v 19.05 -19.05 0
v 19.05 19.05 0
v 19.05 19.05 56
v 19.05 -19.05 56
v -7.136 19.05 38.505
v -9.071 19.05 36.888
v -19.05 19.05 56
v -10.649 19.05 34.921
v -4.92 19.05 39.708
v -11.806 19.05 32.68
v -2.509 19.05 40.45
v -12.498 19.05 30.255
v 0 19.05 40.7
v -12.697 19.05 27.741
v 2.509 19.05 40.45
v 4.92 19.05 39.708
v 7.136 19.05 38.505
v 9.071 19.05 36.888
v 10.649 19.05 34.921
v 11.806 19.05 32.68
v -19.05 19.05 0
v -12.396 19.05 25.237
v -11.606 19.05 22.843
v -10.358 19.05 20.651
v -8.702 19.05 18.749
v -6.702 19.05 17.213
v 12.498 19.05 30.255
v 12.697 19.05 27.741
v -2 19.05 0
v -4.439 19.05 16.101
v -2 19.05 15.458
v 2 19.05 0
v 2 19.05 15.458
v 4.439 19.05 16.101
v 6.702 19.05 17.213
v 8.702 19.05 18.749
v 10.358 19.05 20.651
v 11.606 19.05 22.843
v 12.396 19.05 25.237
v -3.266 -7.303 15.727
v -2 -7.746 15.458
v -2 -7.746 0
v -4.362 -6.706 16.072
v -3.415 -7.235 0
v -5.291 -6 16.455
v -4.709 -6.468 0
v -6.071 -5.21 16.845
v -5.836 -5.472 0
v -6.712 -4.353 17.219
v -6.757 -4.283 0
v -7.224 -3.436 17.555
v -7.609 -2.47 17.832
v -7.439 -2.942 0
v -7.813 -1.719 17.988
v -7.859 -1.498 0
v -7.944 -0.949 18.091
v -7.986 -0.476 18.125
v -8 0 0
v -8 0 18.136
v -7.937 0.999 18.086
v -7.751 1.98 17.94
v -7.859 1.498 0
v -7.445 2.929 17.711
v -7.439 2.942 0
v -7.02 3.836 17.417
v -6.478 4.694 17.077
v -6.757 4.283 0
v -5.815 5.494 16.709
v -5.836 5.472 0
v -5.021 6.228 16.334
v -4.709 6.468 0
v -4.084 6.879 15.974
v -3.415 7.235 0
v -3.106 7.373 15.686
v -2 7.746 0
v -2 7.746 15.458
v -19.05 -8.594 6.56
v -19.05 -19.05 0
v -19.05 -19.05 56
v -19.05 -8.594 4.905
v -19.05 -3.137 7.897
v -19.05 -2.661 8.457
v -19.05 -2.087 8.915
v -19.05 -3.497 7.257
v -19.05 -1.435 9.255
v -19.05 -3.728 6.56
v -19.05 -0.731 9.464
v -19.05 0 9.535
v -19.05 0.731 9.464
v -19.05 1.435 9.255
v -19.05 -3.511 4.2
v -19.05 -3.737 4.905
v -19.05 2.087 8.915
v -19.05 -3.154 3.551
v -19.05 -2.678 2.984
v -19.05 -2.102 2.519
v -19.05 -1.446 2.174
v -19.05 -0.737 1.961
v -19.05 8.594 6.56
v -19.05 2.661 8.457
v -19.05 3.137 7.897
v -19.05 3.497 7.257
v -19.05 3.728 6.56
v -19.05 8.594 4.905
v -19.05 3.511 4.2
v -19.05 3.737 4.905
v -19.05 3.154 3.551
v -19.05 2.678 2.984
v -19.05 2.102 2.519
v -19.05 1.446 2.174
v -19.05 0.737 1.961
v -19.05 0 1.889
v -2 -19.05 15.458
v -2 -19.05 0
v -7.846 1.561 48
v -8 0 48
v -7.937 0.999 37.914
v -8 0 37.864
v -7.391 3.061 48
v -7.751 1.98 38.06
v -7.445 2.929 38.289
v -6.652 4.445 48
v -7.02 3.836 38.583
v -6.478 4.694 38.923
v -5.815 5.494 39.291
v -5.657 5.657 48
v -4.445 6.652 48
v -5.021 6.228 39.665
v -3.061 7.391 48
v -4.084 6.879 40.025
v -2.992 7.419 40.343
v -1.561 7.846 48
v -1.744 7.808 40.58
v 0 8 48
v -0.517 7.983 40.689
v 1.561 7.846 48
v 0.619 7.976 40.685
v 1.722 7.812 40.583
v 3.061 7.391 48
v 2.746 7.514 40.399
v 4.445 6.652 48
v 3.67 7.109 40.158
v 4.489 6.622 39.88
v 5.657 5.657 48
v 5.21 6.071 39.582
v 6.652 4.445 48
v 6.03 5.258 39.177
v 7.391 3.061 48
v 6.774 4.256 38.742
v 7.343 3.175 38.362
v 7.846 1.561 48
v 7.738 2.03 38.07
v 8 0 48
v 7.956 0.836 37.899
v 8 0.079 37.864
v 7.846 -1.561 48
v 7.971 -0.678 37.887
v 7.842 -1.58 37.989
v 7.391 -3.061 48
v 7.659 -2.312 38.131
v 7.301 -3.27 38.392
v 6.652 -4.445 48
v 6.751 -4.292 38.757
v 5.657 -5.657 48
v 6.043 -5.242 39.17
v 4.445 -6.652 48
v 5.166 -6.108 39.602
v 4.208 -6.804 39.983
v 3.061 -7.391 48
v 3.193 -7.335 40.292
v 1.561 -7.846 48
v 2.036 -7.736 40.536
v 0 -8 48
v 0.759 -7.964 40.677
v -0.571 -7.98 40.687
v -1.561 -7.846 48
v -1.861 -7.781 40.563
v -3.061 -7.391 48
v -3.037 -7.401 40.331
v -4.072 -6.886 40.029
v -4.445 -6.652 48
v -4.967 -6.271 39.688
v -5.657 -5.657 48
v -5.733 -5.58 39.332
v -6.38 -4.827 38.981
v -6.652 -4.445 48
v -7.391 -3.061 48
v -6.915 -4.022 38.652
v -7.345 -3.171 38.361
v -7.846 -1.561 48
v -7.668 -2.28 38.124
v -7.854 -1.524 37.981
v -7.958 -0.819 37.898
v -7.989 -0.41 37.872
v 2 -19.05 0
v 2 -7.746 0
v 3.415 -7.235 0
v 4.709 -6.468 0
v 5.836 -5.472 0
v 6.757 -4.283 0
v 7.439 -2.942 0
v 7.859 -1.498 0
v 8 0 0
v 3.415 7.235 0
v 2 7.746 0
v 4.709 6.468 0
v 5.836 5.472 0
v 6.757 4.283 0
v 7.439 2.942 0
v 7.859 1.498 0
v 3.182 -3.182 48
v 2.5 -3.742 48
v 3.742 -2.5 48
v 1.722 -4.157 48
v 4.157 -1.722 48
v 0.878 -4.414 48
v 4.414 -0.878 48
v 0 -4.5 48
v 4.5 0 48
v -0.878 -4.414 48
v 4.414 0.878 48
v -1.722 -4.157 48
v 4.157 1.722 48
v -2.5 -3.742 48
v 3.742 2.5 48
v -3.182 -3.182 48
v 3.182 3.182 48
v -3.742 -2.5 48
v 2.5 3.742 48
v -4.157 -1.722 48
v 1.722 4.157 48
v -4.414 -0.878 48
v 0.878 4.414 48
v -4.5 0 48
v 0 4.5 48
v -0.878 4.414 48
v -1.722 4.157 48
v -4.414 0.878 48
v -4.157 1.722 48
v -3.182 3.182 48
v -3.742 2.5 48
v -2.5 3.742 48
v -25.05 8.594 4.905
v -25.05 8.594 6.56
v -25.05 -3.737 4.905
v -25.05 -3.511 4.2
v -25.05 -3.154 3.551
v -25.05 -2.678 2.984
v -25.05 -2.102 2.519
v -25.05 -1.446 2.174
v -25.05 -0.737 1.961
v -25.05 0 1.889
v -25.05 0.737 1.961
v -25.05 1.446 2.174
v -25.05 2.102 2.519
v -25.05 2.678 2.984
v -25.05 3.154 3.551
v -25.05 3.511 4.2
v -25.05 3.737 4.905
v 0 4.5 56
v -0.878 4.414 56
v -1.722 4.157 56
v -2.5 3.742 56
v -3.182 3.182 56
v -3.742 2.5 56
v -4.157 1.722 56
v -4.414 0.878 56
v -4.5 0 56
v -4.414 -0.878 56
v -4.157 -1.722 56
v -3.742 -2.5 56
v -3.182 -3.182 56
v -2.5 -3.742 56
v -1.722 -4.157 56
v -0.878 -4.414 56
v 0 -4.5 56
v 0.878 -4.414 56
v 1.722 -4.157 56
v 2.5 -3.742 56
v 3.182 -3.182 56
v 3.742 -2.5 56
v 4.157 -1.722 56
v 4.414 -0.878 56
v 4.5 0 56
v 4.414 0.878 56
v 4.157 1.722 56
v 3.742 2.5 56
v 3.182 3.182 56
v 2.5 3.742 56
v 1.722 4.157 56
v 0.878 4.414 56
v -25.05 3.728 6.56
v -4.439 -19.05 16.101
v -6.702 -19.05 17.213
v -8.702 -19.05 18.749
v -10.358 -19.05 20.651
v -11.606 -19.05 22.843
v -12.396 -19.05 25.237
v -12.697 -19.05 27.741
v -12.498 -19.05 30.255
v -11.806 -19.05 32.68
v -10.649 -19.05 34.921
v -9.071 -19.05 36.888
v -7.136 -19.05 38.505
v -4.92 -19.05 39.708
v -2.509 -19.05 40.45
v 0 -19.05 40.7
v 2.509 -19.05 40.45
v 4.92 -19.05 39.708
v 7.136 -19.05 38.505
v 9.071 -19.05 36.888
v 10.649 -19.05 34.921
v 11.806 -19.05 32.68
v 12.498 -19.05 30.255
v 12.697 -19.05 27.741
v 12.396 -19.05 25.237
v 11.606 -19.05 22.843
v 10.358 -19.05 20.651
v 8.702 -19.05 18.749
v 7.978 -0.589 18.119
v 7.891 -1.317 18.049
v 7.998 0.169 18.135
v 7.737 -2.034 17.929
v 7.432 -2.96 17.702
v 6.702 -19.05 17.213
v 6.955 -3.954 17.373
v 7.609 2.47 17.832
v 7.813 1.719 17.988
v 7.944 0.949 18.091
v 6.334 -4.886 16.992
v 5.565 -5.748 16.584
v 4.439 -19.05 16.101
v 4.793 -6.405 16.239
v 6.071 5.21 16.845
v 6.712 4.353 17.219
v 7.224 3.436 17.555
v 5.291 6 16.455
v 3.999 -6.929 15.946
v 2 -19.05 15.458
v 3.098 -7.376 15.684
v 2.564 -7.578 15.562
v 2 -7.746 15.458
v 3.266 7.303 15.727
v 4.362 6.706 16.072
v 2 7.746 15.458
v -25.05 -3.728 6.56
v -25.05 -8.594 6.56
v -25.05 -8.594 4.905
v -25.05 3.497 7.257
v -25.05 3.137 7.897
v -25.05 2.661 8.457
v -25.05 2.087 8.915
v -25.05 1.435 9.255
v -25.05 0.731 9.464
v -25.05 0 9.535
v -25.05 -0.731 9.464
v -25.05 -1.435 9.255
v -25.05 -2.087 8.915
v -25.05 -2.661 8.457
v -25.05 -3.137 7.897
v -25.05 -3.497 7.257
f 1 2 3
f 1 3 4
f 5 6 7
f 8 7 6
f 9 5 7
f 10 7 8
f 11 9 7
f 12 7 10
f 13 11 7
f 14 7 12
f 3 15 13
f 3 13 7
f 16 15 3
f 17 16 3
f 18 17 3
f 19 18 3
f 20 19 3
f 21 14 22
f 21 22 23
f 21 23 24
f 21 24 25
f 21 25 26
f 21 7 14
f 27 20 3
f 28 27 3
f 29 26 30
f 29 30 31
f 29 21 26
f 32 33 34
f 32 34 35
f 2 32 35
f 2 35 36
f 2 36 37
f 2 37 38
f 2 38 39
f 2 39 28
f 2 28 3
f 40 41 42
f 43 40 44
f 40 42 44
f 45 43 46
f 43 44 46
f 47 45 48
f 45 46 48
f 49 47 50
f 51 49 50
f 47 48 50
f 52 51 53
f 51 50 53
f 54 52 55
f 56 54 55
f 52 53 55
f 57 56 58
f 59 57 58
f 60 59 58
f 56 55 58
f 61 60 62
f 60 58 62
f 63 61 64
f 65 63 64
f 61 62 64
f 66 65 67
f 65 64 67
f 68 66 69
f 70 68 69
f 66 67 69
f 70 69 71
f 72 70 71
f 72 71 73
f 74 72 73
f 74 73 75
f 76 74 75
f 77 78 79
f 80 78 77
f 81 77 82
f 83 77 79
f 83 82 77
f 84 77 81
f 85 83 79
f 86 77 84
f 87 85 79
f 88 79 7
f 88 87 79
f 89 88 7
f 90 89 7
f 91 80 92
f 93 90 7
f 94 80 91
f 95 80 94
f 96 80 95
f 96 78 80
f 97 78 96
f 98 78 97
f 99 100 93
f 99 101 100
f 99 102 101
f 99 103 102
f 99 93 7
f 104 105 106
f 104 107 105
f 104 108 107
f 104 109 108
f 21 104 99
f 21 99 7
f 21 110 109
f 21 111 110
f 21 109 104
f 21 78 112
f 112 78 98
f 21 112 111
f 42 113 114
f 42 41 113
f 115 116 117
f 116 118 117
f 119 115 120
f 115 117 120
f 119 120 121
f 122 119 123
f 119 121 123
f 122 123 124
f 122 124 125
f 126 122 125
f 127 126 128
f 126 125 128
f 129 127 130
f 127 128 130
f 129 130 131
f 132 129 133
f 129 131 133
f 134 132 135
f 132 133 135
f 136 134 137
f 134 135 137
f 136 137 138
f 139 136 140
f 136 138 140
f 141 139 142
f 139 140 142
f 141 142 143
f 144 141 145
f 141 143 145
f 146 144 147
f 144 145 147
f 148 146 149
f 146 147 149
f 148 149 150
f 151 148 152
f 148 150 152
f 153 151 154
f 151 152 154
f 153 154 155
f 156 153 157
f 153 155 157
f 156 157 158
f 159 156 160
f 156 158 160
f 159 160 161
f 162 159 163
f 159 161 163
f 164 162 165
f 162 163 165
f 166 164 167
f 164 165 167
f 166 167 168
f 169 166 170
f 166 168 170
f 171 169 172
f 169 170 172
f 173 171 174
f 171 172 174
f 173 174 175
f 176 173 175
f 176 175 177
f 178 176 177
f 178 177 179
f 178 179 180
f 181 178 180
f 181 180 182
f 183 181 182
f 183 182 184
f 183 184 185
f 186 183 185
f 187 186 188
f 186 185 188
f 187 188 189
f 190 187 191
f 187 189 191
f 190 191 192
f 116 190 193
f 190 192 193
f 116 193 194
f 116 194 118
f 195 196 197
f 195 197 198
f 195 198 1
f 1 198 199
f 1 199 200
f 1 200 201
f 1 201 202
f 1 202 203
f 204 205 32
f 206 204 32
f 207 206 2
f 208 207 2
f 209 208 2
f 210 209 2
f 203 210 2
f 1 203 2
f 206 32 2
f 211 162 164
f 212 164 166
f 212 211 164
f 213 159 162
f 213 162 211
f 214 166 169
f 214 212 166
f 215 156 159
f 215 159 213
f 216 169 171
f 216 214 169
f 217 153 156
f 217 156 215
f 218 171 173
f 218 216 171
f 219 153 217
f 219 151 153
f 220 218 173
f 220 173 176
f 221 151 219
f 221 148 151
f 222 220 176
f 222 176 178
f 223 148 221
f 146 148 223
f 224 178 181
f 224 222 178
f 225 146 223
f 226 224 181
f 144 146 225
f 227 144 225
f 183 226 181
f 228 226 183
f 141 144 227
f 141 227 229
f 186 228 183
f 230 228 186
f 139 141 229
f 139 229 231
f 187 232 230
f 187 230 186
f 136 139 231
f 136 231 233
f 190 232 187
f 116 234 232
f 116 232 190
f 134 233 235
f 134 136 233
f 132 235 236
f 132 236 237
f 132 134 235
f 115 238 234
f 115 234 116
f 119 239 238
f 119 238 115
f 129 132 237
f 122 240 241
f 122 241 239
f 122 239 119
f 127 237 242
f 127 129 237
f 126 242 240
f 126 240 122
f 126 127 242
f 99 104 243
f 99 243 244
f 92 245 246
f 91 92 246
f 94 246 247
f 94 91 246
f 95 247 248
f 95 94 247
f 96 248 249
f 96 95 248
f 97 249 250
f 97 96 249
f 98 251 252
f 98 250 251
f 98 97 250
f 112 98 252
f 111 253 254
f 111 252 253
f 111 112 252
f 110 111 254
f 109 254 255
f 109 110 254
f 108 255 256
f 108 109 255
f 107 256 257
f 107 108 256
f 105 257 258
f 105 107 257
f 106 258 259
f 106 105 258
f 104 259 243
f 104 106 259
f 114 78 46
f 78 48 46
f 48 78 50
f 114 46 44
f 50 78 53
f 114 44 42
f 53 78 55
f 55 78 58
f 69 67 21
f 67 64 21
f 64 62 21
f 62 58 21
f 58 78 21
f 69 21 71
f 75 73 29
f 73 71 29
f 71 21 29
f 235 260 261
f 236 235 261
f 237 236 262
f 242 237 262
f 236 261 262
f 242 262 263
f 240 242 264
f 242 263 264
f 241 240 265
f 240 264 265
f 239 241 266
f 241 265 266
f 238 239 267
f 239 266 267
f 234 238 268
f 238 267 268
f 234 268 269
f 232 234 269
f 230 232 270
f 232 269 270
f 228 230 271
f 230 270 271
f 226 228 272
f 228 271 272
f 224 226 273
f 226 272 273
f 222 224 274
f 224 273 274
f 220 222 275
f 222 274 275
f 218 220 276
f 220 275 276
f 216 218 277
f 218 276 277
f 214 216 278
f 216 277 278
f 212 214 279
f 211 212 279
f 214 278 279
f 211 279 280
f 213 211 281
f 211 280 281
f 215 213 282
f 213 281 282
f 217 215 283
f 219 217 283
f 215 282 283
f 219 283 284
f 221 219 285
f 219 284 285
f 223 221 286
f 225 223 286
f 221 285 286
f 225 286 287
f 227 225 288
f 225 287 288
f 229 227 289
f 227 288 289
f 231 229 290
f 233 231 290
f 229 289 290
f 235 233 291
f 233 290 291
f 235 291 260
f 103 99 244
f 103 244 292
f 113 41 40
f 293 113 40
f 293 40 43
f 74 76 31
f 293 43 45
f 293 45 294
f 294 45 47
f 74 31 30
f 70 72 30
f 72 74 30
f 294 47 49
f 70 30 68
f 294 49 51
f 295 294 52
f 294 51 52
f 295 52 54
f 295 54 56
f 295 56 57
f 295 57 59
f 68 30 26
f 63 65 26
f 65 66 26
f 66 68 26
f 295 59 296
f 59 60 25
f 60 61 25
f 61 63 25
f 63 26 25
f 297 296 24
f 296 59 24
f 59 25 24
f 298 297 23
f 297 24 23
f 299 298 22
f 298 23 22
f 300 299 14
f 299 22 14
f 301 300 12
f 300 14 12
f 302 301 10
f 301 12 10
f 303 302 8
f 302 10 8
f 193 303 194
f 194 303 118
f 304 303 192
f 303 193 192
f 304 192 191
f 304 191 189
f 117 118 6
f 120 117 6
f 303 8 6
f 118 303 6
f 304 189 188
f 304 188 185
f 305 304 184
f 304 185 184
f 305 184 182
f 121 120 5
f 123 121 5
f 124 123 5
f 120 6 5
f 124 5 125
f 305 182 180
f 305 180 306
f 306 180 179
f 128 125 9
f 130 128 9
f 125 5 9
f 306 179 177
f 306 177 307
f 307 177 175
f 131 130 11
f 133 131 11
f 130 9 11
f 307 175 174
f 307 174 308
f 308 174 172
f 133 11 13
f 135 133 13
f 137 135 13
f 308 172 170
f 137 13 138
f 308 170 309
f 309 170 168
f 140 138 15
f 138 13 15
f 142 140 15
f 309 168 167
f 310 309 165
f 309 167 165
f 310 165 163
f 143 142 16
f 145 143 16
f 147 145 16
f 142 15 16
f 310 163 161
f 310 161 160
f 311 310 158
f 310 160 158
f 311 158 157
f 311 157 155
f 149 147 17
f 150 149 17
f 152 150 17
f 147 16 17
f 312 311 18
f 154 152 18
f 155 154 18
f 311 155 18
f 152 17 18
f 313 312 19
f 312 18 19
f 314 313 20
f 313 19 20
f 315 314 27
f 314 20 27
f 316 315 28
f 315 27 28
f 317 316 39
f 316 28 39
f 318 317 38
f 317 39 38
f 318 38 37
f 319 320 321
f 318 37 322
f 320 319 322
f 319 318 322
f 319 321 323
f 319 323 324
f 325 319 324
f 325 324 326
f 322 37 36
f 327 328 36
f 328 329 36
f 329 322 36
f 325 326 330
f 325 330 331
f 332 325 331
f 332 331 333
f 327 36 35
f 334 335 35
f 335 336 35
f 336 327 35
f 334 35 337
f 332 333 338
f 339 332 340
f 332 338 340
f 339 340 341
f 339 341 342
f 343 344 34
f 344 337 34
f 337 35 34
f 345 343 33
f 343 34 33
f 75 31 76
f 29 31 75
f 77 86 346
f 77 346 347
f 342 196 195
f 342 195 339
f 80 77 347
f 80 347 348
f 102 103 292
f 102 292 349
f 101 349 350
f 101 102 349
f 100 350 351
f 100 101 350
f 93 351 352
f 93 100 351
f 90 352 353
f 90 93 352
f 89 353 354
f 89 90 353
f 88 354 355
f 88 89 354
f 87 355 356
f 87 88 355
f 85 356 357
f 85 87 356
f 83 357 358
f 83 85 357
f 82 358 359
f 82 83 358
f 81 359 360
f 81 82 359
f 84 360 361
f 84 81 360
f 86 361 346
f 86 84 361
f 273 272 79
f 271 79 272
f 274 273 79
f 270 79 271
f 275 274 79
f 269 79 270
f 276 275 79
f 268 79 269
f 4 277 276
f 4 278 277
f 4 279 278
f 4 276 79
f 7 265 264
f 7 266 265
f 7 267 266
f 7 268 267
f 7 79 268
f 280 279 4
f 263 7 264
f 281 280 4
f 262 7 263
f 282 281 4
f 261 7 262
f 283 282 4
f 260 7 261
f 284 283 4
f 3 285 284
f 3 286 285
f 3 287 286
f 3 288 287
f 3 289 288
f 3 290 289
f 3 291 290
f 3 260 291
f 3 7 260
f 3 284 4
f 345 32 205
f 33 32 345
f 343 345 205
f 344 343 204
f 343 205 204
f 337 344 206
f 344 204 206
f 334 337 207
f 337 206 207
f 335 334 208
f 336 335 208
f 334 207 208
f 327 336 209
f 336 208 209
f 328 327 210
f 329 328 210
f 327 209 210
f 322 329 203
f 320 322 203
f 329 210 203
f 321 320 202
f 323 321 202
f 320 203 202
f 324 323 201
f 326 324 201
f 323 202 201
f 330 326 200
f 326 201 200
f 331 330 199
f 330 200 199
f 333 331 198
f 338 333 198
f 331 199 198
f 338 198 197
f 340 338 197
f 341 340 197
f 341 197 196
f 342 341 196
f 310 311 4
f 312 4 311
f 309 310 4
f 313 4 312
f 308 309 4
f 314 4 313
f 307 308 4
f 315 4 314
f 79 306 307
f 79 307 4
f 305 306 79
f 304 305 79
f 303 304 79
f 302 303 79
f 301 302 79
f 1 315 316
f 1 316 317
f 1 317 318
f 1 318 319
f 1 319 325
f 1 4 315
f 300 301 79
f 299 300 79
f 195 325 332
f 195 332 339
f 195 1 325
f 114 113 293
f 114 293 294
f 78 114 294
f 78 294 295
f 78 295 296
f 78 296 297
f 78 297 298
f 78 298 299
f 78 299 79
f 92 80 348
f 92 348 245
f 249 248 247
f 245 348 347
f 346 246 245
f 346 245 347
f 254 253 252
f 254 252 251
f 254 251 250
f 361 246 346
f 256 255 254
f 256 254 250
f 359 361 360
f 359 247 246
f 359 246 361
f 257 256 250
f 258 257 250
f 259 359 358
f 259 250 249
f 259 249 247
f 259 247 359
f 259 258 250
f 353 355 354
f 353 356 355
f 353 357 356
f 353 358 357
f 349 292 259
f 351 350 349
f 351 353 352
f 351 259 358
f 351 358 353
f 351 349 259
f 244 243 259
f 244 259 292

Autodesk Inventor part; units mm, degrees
ref_plane "YZ Plane" through (0, 0, 0) normal (1, 0, 0) x (0, 1, 0)
ref_plane "XZ Plane" through (0, 0, 0) normal (0, 1, 0) x (-1, 0, 0)
sketch "Sketch1" plane through (0, 0, 0) normal (0, 0, 1) x (1, 0, 0)
  line L0 (-19.05, 19.05) -> (19.05, 19.05)
  line L1 (19.05, 19.05) -> (19.05, -19.05)
  line L2 (19.05, -19.05) -> (-19.05, -19.05)
  line L3 (-19.05, -19.05) -> (-19.05, 19.05)
  point P0 (0, 0)
  point P1 (-19.05, 0)
  point P2 (0, 19.05)
  dimension "d0" = 38.1
extrude "Extrusion1" add sketch "Sketch1" along normal blind 56
sketch "Sketch2" plane through (-19.05, 19.05, 0) normal (0, 1, 0) x (1, 0, 0)
  circle A0 centre (19.05, -28) radius 12.7
  line L0 (0, 0) -> (38.1, 0) projected
  line L1 (0, -56) -> (38.1, -56) projected
  line L2 (17.05, 0) -> (21.05, 0)
  line L3 (21.05, 0) -> (21.05, -28)
  line L4 (21.05, -28) -> (17.05, -28)
  line L5 (17.05, -28) -> (17.05, 0)
  point P0 (19.05, 0)
  dimension "d3" = 28
  dimension "d4" = 25.4
  dimension "d5" = 4
extrude "Extrusion2" cut sketch "Sketch2" against normal through all
ref_plane "Work Plane1" through (0, 0, 48) normal (0, 0, 1) x (1, 0, 0)
sketch "Sketch3" plane through (0, 0, 48) normal (0, 0, 1) x (1, 0, 0)
  point P0 (0, 0)
hole "Hole1" at (0, 0, 48) direction (0, 0, 1) diameter 9 end through all clearance for "Flat Head Machine Screw" size "M8" standard "Ansi Metric M Profile"
sketch "Sketch4" plane through (0, 0, 0) normal (0, 0, -1) x (-1, 0, 0)
  circle A0 centre (0, 0) radius 8
  dimension "d16" = 16
extrude "Extrusion3" cut sketch "Sketch4" against normal up to surface (48 mm away)
sketch "Sketch5" plane through (-19.05, -19.05, 0) normal (-1, 0, 0) x (0, 0, 1)
  line L0 (0, 0) -> (0, 38.1) projected
  circle A0 centre (5.7121, 19.05) radius 3.8228
  line L1 (4.9053, 27.6435) -> (6.5597, 27.6435)
  line L2 (6.5597, 27.6435) -> (6.5597, 10.4565)
  line L3 (6.5597, 10.4565) -> (4.9053, 10.4565)
  line L4 (4.9053, 10.4565) -> (4.9053, 27.6435)
  point P0 (0, 19.05)
  point P1 (6.5597, 19.05)
extrude "Extrusion4" add sketch "Sketch5" along normal blind 6
properties part number "22-134 Block"
